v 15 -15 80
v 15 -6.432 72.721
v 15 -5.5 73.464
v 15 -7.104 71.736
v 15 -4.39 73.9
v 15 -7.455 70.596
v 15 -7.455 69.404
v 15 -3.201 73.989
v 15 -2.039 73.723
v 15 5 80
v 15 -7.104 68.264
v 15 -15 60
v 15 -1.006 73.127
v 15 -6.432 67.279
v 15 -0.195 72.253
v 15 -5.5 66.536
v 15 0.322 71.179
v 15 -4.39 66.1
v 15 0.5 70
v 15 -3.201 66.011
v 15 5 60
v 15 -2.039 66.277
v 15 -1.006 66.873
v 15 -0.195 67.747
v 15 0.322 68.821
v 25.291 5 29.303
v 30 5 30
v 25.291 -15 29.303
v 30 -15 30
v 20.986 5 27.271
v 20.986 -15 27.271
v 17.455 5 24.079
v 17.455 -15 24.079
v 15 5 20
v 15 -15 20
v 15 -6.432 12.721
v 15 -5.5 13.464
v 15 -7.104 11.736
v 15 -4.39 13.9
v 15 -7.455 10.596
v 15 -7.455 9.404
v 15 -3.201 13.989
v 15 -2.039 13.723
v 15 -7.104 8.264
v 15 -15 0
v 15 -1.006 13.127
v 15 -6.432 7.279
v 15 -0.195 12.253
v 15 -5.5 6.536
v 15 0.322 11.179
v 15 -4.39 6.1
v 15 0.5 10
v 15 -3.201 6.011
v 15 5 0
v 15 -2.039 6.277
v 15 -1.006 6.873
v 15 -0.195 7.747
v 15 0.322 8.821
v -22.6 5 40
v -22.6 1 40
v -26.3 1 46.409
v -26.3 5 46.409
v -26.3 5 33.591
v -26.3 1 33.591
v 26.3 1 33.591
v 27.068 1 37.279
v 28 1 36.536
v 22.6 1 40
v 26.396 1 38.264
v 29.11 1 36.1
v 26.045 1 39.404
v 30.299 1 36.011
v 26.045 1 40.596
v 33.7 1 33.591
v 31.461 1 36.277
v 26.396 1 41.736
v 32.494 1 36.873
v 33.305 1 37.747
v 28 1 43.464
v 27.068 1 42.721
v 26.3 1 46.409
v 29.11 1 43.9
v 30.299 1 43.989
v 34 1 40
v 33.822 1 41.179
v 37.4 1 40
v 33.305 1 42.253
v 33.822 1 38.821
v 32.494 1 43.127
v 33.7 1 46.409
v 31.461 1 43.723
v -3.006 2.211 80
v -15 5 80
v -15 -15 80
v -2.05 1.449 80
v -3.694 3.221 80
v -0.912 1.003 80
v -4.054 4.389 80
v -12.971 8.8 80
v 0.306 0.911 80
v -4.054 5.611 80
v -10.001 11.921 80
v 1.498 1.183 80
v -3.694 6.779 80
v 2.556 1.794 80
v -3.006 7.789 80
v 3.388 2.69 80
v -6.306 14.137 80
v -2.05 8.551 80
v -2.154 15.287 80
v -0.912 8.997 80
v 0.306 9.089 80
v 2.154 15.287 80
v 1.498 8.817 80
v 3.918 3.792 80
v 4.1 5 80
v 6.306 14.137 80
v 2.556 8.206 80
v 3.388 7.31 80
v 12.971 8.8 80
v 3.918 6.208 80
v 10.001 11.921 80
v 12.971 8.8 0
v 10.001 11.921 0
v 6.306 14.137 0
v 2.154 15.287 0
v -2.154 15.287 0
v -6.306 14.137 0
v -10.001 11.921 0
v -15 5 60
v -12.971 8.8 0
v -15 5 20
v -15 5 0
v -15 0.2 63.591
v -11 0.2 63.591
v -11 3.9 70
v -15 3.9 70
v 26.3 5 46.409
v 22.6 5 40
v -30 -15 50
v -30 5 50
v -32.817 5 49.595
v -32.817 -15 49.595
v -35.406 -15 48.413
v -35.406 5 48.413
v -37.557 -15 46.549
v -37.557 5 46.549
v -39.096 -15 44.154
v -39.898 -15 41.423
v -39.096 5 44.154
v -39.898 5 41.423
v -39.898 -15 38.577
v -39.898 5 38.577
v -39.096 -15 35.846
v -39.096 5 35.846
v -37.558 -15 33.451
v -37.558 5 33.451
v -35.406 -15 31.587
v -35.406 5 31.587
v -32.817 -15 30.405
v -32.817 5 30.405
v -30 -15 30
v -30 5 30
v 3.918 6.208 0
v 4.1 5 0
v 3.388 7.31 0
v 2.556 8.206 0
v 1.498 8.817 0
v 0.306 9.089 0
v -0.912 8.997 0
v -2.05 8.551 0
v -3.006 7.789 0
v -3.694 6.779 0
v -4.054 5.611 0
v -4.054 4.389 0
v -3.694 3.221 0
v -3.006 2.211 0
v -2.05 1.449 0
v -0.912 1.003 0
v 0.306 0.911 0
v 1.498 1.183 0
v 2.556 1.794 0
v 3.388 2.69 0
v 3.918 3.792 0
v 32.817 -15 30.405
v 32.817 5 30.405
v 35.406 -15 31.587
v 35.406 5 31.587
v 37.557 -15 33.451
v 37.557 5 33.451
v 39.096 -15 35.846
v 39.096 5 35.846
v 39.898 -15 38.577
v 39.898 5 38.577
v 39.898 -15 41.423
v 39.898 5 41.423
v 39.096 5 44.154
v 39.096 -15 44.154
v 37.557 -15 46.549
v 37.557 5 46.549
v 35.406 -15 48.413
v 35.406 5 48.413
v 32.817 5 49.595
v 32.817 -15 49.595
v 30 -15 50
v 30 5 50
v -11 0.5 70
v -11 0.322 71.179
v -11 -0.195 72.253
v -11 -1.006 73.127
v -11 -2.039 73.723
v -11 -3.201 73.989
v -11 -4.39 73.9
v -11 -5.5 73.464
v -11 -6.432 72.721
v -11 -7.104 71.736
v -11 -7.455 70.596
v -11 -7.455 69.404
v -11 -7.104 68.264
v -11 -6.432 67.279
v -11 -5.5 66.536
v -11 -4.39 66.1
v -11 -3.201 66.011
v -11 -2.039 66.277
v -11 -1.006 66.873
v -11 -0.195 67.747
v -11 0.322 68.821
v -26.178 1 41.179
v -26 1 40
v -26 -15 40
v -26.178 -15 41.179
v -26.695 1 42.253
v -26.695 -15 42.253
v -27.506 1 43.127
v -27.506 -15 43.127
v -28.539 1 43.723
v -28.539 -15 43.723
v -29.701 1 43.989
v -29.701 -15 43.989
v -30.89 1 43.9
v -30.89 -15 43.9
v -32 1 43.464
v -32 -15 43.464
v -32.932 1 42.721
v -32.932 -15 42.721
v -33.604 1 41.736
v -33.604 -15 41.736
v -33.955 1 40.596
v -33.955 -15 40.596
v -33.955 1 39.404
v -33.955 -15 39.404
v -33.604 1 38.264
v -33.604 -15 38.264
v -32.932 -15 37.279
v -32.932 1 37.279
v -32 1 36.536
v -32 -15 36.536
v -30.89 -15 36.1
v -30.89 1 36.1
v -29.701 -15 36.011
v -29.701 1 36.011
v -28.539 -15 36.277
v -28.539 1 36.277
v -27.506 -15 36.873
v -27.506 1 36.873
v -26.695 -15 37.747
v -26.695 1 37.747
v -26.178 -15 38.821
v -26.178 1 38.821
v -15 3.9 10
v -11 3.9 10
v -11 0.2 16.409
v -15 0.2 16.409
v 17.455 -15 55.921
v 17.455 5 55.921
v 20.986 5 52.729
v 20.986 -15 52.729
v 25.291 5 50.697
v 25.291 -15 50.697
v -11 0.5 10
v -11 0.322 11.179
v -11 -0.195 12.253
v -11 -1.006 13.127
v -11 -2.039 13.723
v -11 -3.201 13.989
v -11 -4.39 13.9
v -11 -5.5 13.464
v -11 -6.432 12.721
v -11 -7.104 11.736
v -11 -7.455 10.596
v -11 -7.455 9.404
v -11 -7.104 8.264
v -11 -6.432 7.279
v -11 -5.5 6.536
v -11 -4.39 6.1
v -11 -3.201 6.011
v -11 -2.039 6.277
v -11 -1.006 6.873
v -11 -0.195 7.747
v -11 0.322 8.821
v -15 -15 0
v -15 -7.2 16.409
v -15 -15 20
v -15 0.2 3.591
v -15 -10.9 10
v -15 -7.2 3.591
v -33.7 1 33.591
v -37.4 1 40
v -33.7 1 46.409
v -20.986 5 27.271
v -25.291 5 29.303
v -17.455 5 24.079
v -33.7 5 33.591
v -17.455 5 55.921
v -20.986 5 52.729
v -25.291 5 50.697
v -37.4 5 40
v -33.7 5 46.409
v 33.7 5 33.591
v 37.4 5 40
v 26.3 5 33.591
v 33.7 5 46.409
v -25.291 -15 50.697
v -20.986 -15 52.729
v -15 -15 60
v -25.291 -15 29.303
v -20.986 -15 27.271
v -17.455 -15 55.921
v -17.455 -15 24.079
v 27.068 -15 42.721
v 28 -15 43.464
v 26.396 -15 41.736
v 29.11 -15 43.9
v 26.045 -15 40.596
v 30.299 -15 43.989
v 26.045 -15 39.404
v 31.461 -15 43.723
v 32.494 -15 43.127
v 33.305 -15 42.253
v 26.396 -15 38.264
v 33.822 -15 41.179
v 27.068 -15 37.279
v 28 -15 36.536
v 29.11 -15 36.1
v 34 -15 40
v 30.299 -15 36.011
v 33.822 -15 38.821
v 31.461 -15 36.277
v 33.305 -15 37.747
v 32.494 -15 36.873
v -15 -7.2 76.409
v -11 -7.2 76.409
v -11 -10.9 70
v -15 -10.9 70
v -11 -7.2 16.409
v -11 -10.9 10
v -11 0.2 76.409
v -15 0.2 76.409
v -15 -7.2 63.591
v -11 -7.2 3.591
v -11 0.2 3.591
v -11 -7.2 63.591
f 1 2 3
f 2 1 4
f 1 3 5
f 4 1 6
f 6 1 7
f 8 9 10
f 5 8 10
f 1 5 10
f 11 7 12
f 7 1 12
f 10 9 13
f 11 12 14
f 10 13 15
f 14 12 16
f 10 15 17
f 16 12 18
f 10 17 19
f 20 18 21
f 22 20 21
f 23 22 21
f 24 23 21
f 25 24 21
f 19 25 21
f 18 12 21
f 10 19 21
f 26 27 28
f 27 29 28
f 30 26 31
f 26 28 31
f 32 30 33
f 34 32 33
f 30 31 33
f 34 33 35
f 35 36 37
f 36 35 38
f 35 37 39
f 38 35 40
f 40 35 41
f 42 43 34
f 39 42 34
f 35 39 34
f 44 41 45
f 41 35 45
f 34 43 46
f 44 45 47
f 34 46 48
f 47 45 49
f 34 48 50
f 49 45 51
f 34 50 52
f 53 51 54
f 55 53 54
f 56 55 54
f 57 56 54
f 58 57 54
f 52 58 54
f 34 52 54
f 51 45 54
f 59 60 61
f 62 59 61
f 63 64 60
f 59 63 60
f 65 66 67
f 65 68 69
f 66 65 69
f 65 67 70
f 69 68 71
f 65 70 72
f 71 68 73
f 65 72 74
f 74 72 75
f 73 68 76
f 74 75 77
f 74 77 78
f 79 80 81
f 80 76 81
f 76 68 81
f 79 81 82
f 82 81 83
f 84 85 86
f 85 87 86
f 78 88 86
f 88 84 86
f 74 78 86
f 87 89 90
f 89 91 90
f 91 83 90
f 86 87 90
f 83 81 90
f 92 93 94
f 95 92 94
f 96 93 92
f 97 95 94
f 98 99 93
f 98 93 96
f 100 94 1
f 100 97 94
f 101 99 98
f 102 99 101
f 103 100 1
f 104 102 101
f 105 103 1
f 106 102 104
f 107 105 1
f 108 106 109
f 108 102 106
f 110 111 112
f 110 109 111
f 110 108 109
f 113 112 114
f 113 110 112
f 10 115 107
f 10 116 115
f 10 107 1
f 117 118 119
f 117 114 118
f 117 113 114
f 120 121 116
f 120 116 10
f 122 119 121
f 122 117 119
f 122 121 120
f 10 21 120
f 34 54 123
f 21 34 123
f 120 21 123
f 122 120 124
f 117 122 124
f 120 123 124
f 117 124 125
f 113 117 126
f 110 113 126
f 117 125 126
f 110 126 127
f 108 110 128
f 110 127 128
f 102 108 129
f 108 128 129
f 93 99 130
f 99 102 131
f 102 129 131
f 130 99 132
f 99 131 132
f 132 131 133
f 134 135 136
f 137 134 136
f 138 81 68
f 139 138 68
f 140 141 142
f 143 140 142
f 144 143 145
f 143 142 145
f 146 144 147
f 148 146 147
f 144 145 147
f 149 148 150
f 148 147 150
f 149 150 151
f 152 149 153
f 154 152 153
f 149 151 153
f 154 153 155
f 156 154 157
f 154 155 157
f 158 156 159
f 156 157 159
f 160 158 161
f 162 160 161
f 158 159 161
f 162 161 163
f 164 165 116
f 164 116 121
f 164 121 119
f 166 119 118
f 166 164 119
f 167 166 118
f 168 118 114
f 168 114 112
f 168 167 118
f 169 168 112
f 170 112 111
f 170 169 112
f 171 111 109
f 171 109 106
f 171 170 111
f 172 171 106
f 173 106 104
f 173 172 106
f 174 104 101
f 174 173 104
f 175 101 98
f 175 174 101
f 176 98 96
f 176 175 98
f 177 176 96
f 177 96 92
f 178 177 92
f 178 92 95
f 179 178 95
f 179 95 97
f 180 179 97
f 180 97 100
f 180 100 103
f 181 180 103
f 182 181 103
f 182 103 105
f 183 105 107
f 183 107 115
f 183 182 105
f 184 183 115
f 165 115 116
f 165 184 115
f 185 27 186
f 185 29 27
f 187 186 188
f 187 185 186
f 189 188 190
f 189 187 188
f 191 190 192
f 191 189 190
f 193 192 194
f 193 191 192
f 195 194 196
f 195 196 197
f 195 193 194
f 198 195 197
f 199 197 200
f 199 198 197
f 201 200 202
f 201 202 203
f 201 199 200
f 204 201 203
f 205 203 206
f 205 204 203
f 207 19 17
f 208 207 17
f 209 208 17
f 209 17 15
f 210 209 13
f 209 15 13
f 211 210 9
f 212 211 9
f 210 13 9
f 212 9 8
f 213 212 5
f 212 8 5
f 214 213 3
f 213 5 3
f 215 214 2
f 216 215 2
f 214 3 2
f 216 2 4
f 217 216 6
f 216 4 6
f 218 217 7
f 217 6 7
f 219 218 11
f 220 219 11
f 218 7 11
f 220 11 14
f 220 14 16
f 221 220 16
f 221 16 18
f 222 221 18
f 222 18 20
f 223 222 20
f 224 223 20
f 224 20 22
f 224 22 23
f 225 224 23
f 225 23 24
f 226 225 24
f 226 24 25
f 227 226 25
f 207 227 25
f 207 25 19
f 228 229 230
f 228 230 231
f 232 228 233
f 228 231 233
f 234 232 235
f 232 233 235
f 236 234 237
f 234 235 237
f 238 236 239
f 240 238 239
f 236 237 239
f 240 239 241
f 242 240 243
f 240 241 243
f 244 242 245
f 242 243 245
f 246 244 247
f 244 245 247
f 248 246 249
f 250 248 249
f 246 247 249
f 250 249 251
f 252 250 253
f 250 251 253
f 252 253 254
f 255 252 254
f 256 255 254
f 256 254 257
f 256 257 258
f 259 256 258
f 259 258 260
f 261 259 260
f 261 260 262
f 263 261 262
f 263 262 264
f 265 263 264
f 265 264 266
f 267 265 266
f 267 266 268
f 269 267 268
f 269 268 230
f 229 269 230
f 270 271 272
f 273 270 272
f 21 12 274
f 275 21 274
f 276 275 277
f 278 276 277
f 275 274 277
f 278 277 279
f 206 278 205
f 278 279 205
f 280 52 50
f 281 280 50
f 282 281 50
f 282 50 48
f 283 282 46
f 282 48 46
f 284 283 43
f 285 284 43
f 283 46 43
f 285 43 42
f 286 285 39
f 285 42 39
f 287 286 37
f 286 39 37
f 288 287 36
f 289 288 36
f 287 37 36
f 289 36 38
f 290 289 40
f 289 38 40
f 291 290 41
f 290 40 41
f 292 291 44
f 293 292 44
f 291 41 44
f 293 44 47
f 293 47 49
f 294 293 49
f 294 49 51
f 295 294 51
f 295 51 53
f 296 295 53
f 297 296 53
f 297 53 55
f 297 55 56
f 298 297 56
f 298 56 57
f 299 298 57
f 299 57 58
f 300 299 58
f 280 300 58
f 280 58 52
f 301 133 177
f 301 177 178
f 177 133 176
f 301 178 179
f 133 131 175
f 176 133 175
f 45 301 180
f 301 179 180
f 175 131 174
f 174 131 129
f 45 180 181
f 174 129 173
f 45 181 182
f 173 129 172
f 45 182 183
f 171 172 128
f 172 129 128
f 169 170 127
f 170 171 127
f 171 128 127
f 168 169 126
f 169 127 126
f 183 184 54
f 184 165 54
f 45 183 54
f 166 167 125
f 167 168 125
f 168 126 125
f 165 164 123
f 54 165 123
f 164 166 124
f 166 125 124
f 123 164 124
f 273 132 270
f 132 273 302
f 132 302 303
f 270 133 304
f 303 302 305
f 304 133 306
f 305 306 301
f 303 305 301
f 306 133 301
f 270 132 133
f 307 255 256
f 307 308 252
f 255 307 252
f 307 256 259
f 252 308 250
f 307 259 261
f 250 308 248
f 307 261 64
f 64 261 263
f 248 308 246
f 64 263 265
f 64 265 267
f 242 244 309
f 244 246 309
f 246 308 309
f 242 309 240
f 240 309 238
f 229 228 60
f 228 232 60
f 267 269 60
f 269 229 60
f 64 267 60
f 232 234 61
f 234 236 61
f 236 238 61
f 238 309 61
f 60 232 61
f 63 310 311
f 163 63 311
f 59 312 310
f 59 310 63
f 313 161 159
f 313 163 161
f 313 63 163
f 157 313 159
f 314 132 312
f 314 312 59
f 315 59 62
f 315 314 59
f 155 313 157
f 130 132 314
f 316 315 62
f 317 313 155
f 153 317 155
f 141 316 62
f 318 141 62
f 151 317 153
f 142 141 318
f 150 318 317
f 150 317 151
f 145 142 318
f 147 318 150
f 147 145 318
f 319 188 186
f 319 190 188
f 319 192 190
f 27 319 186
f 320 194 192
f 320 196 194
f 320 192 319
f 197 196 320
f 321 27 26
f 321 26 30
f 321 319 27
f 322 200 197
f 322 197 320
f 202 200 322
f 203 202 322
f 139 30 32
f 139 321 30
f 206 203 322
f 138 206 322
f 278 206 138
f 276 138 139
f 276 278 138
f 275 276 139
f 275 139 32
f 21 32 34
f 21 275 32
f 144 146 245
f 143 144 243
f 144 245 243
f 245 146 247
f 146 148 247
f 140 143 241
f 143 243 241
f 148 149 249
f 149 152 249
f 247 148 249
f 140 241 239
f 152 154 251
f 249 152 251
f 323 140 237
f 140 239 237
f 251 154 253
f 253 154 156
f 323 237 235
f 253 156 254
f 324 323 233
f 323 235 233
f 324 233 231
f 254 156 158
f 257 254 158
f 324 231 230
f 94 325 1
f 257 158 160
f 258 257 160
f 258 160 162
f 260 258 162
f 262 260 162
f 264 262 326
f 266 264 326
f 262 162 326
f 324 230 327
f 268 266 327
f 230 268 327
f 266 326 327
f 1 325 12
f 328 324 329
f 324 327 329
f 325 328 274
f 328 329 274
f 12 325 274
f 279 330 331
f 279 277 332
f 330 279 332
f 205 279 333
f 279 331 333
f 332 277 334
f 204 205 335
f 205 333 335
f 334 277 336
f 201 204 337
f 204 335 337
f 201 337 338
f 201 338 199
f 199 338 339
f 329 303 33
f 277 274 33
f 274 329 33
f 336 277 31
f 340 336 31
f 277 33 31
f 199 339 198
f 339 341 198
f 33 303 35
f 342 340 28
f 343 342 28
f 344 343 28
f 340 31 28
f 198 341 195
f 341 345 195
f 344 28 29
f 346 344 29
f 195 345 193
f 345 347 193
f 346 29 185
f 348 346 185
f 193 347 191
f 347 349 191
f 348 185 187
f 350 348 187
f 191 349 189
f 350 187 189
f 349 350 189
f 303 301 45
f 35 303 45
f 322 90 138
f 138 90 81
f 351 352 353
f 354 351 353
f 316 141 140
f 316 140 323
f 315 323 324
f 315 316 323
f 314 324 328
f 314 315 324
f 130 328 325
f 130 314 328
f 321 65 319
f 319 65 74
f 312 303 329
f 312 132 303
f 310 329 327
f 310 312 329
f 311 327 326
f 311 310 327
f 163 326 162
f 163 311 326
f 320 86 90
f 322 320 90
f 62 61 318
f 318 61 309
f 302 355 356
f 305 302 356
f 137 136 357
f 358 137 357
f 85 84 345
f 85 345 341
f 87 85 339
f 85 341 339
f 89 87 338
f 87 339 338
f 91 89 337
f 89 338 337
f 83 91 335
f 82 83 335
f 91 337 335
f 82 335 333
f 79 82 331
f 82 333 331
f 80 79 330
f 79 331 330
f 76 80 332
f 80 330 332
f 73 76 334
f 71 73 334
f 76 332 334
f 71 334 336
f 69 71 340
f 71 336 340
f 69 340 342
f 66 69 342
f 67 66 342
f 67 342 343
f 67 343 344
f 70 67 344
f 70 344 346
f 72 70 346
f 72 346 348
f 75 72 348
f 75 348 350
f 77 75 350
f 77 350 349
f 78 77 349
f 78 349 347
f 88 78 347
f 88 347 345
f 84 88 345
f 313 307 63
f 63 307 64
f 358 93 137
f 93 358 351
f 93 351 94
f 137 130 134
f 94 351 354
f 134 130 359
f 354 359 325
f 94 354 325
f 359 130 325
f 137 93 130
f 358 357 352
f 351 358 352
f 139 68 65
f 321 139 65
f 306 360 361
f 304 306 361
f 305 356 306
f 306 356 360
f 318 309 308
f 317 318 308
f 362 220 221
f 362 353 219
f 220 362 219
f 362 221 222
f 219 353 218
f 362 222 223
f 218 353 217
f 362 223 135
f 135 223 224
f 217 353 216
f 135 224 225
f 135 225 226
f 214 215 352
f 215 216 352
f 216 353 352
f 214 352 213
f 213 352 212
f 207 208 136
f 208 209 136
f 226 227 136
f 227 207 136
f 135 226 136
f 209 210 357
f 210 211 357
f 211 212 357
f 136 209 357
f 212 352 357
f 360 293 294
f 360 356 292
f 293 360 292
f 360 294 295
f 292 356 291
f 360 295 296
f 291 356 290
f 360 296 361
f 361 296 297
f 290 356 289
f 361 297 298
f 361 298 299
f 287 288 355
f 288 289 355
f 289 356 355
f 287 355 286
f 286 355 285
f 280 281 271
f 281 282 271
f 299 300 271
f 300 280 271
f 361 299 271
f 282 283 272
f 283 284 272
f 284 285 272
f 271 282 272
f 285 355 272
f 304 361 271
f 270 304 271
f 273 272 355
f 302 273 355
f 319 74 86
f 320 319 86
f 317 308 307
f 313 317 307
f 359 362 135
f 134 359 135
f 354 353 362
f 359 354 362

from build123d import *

# Parameters (mm, degrees)
SKETCH007_R  = 4
PAD003_DEPTH = 20
SKETCH001_R  = 4
PAD004_DEPTH = 32
PAD006_DEPTH = 4
PAD001_DEPTH = 4
SKETCH_R     = 4.1
PAD_DEPTH    = 80
PAD008_DEPTH = 10


with BuildPart() as rodhole01:
    # Sketch007 → Pad003 (new body)
    with BuildSketch(Plane.XZ.offset(15)):
        with Locations((30, 40)):
            Circle(SKETCH007_R)
        with Locations((-30, 40)):
            Circle(SKETCH007_R)
    extrude(amount=-PAD003_DEPTH)


with BuildPart() as rodhole02:
    # Sketch001 → Pad004 (new body)
    with BuildSketch(Plane.YZ.offset(16)):
        with Locations((-3.5, 70)):
            Circle(SKETCH001_R)
        with Locations((-3.5, 10)):
            Circle(SKETCH001_R)
    extrude(amount=-PAD004_DEPTH)


with BuildPart() as sidenutflush02:
    # Sketch002 → Pad006 (new body)
    with BuildSketch(Plane.YZ.offset(-11)):
        Polygon((3.9, 70), (0.2, 76.408588), (-7.2, 76.408588), (-10.9, 70), (-7.2, 63.591412), (0.2, 63.591412), align=None)
        Polygon((0.2, 3.591412), (3.9, 10), (0.2, 16.408588), (-7.2, 16.408588), (-10.9, 10), (-7.2, 3.591412), align=None)
    extrude(amount=-PAD006_DEPTH)


with BuildPart() as cutblock:
    # Sketch008 → Pad001 (new body)
    with BuildSketch(Plane.XZ.offset(-1)):
        Polygon((33.7, 33.591412), (37.4, 40), (33.7, 46.408588), (26.3, 46.408588), (22.6, 40), (26.3, 33.591412), align=None)
        Polygon((-26.3, 33.591412), (-22.6, 40), (-26.3, 46.408588), (-33.7, 46.408588), (-37.4, 40), (-33.7, 33.591412), align=None)
    extrude(amount=-PAD001_DEPTH)

    # Fusion001: union RodHole01, RodHole02, SideNutFlush02
    add(rodhole01.part)
    add(rodhole02.part)
    add(sidenutflush02.part)


with BuildPart() as base:
    # Sketch → Pad (new body)
    with BuildSketch(Plane.XY):
        with BuildLine():
            Line((-15, 5), (-15, -15))
            Line((-15, -15), (15, -15))
            Line((15, -15), (15, 5))
            ThreePointArc((15, 5), (0, 15.432236), (-15, 5))
        make_face()
        with Locations((0, 5)):
            Circle(SKETCH_R, mode=Mode.SUBTRACT)
    extrude(amount=PAD_DEPTH)


with BuildPart() as cut:
    # Sketch010 → Pad008 (new body, symmetric)
    with BuildSketch(Plane.XZ.offset(5)):
        with BuildLine():
            ThreePointArc((-15, 20), (-20.986141, 27.270818), (-30.000033, 30))
            ThreePointArc((-30.000014, 50), (-40, 40.000009), (-30.000033, 30))
            ThreePointArc((-30.000014, 50), (-20.986133, 52.729187), (-15, 60))
            Line((-15, 60), (-15, 20))
        make_face()
        with BuildLine():
            ThreePointArc((15, 60), (20.986133, 52.729187), (30.000013, 50))
            ThreePointArc((30.000013, 30), (40, 40), (30.000013, 50))
            ThreePointArc((30.000013, 30), (20.986133, 27.270813), (15, 20))
            Line((15, 60), (15, 20))
        make_face()
    extrude(amount=PAD008_DEPTH, both=True)

    # Fusion: union Base
    add(base.part)

    # Cut: cut CutBlock
    add(cutblock.part, mode=Mode.SUBTRACT)


solid = cut.part
